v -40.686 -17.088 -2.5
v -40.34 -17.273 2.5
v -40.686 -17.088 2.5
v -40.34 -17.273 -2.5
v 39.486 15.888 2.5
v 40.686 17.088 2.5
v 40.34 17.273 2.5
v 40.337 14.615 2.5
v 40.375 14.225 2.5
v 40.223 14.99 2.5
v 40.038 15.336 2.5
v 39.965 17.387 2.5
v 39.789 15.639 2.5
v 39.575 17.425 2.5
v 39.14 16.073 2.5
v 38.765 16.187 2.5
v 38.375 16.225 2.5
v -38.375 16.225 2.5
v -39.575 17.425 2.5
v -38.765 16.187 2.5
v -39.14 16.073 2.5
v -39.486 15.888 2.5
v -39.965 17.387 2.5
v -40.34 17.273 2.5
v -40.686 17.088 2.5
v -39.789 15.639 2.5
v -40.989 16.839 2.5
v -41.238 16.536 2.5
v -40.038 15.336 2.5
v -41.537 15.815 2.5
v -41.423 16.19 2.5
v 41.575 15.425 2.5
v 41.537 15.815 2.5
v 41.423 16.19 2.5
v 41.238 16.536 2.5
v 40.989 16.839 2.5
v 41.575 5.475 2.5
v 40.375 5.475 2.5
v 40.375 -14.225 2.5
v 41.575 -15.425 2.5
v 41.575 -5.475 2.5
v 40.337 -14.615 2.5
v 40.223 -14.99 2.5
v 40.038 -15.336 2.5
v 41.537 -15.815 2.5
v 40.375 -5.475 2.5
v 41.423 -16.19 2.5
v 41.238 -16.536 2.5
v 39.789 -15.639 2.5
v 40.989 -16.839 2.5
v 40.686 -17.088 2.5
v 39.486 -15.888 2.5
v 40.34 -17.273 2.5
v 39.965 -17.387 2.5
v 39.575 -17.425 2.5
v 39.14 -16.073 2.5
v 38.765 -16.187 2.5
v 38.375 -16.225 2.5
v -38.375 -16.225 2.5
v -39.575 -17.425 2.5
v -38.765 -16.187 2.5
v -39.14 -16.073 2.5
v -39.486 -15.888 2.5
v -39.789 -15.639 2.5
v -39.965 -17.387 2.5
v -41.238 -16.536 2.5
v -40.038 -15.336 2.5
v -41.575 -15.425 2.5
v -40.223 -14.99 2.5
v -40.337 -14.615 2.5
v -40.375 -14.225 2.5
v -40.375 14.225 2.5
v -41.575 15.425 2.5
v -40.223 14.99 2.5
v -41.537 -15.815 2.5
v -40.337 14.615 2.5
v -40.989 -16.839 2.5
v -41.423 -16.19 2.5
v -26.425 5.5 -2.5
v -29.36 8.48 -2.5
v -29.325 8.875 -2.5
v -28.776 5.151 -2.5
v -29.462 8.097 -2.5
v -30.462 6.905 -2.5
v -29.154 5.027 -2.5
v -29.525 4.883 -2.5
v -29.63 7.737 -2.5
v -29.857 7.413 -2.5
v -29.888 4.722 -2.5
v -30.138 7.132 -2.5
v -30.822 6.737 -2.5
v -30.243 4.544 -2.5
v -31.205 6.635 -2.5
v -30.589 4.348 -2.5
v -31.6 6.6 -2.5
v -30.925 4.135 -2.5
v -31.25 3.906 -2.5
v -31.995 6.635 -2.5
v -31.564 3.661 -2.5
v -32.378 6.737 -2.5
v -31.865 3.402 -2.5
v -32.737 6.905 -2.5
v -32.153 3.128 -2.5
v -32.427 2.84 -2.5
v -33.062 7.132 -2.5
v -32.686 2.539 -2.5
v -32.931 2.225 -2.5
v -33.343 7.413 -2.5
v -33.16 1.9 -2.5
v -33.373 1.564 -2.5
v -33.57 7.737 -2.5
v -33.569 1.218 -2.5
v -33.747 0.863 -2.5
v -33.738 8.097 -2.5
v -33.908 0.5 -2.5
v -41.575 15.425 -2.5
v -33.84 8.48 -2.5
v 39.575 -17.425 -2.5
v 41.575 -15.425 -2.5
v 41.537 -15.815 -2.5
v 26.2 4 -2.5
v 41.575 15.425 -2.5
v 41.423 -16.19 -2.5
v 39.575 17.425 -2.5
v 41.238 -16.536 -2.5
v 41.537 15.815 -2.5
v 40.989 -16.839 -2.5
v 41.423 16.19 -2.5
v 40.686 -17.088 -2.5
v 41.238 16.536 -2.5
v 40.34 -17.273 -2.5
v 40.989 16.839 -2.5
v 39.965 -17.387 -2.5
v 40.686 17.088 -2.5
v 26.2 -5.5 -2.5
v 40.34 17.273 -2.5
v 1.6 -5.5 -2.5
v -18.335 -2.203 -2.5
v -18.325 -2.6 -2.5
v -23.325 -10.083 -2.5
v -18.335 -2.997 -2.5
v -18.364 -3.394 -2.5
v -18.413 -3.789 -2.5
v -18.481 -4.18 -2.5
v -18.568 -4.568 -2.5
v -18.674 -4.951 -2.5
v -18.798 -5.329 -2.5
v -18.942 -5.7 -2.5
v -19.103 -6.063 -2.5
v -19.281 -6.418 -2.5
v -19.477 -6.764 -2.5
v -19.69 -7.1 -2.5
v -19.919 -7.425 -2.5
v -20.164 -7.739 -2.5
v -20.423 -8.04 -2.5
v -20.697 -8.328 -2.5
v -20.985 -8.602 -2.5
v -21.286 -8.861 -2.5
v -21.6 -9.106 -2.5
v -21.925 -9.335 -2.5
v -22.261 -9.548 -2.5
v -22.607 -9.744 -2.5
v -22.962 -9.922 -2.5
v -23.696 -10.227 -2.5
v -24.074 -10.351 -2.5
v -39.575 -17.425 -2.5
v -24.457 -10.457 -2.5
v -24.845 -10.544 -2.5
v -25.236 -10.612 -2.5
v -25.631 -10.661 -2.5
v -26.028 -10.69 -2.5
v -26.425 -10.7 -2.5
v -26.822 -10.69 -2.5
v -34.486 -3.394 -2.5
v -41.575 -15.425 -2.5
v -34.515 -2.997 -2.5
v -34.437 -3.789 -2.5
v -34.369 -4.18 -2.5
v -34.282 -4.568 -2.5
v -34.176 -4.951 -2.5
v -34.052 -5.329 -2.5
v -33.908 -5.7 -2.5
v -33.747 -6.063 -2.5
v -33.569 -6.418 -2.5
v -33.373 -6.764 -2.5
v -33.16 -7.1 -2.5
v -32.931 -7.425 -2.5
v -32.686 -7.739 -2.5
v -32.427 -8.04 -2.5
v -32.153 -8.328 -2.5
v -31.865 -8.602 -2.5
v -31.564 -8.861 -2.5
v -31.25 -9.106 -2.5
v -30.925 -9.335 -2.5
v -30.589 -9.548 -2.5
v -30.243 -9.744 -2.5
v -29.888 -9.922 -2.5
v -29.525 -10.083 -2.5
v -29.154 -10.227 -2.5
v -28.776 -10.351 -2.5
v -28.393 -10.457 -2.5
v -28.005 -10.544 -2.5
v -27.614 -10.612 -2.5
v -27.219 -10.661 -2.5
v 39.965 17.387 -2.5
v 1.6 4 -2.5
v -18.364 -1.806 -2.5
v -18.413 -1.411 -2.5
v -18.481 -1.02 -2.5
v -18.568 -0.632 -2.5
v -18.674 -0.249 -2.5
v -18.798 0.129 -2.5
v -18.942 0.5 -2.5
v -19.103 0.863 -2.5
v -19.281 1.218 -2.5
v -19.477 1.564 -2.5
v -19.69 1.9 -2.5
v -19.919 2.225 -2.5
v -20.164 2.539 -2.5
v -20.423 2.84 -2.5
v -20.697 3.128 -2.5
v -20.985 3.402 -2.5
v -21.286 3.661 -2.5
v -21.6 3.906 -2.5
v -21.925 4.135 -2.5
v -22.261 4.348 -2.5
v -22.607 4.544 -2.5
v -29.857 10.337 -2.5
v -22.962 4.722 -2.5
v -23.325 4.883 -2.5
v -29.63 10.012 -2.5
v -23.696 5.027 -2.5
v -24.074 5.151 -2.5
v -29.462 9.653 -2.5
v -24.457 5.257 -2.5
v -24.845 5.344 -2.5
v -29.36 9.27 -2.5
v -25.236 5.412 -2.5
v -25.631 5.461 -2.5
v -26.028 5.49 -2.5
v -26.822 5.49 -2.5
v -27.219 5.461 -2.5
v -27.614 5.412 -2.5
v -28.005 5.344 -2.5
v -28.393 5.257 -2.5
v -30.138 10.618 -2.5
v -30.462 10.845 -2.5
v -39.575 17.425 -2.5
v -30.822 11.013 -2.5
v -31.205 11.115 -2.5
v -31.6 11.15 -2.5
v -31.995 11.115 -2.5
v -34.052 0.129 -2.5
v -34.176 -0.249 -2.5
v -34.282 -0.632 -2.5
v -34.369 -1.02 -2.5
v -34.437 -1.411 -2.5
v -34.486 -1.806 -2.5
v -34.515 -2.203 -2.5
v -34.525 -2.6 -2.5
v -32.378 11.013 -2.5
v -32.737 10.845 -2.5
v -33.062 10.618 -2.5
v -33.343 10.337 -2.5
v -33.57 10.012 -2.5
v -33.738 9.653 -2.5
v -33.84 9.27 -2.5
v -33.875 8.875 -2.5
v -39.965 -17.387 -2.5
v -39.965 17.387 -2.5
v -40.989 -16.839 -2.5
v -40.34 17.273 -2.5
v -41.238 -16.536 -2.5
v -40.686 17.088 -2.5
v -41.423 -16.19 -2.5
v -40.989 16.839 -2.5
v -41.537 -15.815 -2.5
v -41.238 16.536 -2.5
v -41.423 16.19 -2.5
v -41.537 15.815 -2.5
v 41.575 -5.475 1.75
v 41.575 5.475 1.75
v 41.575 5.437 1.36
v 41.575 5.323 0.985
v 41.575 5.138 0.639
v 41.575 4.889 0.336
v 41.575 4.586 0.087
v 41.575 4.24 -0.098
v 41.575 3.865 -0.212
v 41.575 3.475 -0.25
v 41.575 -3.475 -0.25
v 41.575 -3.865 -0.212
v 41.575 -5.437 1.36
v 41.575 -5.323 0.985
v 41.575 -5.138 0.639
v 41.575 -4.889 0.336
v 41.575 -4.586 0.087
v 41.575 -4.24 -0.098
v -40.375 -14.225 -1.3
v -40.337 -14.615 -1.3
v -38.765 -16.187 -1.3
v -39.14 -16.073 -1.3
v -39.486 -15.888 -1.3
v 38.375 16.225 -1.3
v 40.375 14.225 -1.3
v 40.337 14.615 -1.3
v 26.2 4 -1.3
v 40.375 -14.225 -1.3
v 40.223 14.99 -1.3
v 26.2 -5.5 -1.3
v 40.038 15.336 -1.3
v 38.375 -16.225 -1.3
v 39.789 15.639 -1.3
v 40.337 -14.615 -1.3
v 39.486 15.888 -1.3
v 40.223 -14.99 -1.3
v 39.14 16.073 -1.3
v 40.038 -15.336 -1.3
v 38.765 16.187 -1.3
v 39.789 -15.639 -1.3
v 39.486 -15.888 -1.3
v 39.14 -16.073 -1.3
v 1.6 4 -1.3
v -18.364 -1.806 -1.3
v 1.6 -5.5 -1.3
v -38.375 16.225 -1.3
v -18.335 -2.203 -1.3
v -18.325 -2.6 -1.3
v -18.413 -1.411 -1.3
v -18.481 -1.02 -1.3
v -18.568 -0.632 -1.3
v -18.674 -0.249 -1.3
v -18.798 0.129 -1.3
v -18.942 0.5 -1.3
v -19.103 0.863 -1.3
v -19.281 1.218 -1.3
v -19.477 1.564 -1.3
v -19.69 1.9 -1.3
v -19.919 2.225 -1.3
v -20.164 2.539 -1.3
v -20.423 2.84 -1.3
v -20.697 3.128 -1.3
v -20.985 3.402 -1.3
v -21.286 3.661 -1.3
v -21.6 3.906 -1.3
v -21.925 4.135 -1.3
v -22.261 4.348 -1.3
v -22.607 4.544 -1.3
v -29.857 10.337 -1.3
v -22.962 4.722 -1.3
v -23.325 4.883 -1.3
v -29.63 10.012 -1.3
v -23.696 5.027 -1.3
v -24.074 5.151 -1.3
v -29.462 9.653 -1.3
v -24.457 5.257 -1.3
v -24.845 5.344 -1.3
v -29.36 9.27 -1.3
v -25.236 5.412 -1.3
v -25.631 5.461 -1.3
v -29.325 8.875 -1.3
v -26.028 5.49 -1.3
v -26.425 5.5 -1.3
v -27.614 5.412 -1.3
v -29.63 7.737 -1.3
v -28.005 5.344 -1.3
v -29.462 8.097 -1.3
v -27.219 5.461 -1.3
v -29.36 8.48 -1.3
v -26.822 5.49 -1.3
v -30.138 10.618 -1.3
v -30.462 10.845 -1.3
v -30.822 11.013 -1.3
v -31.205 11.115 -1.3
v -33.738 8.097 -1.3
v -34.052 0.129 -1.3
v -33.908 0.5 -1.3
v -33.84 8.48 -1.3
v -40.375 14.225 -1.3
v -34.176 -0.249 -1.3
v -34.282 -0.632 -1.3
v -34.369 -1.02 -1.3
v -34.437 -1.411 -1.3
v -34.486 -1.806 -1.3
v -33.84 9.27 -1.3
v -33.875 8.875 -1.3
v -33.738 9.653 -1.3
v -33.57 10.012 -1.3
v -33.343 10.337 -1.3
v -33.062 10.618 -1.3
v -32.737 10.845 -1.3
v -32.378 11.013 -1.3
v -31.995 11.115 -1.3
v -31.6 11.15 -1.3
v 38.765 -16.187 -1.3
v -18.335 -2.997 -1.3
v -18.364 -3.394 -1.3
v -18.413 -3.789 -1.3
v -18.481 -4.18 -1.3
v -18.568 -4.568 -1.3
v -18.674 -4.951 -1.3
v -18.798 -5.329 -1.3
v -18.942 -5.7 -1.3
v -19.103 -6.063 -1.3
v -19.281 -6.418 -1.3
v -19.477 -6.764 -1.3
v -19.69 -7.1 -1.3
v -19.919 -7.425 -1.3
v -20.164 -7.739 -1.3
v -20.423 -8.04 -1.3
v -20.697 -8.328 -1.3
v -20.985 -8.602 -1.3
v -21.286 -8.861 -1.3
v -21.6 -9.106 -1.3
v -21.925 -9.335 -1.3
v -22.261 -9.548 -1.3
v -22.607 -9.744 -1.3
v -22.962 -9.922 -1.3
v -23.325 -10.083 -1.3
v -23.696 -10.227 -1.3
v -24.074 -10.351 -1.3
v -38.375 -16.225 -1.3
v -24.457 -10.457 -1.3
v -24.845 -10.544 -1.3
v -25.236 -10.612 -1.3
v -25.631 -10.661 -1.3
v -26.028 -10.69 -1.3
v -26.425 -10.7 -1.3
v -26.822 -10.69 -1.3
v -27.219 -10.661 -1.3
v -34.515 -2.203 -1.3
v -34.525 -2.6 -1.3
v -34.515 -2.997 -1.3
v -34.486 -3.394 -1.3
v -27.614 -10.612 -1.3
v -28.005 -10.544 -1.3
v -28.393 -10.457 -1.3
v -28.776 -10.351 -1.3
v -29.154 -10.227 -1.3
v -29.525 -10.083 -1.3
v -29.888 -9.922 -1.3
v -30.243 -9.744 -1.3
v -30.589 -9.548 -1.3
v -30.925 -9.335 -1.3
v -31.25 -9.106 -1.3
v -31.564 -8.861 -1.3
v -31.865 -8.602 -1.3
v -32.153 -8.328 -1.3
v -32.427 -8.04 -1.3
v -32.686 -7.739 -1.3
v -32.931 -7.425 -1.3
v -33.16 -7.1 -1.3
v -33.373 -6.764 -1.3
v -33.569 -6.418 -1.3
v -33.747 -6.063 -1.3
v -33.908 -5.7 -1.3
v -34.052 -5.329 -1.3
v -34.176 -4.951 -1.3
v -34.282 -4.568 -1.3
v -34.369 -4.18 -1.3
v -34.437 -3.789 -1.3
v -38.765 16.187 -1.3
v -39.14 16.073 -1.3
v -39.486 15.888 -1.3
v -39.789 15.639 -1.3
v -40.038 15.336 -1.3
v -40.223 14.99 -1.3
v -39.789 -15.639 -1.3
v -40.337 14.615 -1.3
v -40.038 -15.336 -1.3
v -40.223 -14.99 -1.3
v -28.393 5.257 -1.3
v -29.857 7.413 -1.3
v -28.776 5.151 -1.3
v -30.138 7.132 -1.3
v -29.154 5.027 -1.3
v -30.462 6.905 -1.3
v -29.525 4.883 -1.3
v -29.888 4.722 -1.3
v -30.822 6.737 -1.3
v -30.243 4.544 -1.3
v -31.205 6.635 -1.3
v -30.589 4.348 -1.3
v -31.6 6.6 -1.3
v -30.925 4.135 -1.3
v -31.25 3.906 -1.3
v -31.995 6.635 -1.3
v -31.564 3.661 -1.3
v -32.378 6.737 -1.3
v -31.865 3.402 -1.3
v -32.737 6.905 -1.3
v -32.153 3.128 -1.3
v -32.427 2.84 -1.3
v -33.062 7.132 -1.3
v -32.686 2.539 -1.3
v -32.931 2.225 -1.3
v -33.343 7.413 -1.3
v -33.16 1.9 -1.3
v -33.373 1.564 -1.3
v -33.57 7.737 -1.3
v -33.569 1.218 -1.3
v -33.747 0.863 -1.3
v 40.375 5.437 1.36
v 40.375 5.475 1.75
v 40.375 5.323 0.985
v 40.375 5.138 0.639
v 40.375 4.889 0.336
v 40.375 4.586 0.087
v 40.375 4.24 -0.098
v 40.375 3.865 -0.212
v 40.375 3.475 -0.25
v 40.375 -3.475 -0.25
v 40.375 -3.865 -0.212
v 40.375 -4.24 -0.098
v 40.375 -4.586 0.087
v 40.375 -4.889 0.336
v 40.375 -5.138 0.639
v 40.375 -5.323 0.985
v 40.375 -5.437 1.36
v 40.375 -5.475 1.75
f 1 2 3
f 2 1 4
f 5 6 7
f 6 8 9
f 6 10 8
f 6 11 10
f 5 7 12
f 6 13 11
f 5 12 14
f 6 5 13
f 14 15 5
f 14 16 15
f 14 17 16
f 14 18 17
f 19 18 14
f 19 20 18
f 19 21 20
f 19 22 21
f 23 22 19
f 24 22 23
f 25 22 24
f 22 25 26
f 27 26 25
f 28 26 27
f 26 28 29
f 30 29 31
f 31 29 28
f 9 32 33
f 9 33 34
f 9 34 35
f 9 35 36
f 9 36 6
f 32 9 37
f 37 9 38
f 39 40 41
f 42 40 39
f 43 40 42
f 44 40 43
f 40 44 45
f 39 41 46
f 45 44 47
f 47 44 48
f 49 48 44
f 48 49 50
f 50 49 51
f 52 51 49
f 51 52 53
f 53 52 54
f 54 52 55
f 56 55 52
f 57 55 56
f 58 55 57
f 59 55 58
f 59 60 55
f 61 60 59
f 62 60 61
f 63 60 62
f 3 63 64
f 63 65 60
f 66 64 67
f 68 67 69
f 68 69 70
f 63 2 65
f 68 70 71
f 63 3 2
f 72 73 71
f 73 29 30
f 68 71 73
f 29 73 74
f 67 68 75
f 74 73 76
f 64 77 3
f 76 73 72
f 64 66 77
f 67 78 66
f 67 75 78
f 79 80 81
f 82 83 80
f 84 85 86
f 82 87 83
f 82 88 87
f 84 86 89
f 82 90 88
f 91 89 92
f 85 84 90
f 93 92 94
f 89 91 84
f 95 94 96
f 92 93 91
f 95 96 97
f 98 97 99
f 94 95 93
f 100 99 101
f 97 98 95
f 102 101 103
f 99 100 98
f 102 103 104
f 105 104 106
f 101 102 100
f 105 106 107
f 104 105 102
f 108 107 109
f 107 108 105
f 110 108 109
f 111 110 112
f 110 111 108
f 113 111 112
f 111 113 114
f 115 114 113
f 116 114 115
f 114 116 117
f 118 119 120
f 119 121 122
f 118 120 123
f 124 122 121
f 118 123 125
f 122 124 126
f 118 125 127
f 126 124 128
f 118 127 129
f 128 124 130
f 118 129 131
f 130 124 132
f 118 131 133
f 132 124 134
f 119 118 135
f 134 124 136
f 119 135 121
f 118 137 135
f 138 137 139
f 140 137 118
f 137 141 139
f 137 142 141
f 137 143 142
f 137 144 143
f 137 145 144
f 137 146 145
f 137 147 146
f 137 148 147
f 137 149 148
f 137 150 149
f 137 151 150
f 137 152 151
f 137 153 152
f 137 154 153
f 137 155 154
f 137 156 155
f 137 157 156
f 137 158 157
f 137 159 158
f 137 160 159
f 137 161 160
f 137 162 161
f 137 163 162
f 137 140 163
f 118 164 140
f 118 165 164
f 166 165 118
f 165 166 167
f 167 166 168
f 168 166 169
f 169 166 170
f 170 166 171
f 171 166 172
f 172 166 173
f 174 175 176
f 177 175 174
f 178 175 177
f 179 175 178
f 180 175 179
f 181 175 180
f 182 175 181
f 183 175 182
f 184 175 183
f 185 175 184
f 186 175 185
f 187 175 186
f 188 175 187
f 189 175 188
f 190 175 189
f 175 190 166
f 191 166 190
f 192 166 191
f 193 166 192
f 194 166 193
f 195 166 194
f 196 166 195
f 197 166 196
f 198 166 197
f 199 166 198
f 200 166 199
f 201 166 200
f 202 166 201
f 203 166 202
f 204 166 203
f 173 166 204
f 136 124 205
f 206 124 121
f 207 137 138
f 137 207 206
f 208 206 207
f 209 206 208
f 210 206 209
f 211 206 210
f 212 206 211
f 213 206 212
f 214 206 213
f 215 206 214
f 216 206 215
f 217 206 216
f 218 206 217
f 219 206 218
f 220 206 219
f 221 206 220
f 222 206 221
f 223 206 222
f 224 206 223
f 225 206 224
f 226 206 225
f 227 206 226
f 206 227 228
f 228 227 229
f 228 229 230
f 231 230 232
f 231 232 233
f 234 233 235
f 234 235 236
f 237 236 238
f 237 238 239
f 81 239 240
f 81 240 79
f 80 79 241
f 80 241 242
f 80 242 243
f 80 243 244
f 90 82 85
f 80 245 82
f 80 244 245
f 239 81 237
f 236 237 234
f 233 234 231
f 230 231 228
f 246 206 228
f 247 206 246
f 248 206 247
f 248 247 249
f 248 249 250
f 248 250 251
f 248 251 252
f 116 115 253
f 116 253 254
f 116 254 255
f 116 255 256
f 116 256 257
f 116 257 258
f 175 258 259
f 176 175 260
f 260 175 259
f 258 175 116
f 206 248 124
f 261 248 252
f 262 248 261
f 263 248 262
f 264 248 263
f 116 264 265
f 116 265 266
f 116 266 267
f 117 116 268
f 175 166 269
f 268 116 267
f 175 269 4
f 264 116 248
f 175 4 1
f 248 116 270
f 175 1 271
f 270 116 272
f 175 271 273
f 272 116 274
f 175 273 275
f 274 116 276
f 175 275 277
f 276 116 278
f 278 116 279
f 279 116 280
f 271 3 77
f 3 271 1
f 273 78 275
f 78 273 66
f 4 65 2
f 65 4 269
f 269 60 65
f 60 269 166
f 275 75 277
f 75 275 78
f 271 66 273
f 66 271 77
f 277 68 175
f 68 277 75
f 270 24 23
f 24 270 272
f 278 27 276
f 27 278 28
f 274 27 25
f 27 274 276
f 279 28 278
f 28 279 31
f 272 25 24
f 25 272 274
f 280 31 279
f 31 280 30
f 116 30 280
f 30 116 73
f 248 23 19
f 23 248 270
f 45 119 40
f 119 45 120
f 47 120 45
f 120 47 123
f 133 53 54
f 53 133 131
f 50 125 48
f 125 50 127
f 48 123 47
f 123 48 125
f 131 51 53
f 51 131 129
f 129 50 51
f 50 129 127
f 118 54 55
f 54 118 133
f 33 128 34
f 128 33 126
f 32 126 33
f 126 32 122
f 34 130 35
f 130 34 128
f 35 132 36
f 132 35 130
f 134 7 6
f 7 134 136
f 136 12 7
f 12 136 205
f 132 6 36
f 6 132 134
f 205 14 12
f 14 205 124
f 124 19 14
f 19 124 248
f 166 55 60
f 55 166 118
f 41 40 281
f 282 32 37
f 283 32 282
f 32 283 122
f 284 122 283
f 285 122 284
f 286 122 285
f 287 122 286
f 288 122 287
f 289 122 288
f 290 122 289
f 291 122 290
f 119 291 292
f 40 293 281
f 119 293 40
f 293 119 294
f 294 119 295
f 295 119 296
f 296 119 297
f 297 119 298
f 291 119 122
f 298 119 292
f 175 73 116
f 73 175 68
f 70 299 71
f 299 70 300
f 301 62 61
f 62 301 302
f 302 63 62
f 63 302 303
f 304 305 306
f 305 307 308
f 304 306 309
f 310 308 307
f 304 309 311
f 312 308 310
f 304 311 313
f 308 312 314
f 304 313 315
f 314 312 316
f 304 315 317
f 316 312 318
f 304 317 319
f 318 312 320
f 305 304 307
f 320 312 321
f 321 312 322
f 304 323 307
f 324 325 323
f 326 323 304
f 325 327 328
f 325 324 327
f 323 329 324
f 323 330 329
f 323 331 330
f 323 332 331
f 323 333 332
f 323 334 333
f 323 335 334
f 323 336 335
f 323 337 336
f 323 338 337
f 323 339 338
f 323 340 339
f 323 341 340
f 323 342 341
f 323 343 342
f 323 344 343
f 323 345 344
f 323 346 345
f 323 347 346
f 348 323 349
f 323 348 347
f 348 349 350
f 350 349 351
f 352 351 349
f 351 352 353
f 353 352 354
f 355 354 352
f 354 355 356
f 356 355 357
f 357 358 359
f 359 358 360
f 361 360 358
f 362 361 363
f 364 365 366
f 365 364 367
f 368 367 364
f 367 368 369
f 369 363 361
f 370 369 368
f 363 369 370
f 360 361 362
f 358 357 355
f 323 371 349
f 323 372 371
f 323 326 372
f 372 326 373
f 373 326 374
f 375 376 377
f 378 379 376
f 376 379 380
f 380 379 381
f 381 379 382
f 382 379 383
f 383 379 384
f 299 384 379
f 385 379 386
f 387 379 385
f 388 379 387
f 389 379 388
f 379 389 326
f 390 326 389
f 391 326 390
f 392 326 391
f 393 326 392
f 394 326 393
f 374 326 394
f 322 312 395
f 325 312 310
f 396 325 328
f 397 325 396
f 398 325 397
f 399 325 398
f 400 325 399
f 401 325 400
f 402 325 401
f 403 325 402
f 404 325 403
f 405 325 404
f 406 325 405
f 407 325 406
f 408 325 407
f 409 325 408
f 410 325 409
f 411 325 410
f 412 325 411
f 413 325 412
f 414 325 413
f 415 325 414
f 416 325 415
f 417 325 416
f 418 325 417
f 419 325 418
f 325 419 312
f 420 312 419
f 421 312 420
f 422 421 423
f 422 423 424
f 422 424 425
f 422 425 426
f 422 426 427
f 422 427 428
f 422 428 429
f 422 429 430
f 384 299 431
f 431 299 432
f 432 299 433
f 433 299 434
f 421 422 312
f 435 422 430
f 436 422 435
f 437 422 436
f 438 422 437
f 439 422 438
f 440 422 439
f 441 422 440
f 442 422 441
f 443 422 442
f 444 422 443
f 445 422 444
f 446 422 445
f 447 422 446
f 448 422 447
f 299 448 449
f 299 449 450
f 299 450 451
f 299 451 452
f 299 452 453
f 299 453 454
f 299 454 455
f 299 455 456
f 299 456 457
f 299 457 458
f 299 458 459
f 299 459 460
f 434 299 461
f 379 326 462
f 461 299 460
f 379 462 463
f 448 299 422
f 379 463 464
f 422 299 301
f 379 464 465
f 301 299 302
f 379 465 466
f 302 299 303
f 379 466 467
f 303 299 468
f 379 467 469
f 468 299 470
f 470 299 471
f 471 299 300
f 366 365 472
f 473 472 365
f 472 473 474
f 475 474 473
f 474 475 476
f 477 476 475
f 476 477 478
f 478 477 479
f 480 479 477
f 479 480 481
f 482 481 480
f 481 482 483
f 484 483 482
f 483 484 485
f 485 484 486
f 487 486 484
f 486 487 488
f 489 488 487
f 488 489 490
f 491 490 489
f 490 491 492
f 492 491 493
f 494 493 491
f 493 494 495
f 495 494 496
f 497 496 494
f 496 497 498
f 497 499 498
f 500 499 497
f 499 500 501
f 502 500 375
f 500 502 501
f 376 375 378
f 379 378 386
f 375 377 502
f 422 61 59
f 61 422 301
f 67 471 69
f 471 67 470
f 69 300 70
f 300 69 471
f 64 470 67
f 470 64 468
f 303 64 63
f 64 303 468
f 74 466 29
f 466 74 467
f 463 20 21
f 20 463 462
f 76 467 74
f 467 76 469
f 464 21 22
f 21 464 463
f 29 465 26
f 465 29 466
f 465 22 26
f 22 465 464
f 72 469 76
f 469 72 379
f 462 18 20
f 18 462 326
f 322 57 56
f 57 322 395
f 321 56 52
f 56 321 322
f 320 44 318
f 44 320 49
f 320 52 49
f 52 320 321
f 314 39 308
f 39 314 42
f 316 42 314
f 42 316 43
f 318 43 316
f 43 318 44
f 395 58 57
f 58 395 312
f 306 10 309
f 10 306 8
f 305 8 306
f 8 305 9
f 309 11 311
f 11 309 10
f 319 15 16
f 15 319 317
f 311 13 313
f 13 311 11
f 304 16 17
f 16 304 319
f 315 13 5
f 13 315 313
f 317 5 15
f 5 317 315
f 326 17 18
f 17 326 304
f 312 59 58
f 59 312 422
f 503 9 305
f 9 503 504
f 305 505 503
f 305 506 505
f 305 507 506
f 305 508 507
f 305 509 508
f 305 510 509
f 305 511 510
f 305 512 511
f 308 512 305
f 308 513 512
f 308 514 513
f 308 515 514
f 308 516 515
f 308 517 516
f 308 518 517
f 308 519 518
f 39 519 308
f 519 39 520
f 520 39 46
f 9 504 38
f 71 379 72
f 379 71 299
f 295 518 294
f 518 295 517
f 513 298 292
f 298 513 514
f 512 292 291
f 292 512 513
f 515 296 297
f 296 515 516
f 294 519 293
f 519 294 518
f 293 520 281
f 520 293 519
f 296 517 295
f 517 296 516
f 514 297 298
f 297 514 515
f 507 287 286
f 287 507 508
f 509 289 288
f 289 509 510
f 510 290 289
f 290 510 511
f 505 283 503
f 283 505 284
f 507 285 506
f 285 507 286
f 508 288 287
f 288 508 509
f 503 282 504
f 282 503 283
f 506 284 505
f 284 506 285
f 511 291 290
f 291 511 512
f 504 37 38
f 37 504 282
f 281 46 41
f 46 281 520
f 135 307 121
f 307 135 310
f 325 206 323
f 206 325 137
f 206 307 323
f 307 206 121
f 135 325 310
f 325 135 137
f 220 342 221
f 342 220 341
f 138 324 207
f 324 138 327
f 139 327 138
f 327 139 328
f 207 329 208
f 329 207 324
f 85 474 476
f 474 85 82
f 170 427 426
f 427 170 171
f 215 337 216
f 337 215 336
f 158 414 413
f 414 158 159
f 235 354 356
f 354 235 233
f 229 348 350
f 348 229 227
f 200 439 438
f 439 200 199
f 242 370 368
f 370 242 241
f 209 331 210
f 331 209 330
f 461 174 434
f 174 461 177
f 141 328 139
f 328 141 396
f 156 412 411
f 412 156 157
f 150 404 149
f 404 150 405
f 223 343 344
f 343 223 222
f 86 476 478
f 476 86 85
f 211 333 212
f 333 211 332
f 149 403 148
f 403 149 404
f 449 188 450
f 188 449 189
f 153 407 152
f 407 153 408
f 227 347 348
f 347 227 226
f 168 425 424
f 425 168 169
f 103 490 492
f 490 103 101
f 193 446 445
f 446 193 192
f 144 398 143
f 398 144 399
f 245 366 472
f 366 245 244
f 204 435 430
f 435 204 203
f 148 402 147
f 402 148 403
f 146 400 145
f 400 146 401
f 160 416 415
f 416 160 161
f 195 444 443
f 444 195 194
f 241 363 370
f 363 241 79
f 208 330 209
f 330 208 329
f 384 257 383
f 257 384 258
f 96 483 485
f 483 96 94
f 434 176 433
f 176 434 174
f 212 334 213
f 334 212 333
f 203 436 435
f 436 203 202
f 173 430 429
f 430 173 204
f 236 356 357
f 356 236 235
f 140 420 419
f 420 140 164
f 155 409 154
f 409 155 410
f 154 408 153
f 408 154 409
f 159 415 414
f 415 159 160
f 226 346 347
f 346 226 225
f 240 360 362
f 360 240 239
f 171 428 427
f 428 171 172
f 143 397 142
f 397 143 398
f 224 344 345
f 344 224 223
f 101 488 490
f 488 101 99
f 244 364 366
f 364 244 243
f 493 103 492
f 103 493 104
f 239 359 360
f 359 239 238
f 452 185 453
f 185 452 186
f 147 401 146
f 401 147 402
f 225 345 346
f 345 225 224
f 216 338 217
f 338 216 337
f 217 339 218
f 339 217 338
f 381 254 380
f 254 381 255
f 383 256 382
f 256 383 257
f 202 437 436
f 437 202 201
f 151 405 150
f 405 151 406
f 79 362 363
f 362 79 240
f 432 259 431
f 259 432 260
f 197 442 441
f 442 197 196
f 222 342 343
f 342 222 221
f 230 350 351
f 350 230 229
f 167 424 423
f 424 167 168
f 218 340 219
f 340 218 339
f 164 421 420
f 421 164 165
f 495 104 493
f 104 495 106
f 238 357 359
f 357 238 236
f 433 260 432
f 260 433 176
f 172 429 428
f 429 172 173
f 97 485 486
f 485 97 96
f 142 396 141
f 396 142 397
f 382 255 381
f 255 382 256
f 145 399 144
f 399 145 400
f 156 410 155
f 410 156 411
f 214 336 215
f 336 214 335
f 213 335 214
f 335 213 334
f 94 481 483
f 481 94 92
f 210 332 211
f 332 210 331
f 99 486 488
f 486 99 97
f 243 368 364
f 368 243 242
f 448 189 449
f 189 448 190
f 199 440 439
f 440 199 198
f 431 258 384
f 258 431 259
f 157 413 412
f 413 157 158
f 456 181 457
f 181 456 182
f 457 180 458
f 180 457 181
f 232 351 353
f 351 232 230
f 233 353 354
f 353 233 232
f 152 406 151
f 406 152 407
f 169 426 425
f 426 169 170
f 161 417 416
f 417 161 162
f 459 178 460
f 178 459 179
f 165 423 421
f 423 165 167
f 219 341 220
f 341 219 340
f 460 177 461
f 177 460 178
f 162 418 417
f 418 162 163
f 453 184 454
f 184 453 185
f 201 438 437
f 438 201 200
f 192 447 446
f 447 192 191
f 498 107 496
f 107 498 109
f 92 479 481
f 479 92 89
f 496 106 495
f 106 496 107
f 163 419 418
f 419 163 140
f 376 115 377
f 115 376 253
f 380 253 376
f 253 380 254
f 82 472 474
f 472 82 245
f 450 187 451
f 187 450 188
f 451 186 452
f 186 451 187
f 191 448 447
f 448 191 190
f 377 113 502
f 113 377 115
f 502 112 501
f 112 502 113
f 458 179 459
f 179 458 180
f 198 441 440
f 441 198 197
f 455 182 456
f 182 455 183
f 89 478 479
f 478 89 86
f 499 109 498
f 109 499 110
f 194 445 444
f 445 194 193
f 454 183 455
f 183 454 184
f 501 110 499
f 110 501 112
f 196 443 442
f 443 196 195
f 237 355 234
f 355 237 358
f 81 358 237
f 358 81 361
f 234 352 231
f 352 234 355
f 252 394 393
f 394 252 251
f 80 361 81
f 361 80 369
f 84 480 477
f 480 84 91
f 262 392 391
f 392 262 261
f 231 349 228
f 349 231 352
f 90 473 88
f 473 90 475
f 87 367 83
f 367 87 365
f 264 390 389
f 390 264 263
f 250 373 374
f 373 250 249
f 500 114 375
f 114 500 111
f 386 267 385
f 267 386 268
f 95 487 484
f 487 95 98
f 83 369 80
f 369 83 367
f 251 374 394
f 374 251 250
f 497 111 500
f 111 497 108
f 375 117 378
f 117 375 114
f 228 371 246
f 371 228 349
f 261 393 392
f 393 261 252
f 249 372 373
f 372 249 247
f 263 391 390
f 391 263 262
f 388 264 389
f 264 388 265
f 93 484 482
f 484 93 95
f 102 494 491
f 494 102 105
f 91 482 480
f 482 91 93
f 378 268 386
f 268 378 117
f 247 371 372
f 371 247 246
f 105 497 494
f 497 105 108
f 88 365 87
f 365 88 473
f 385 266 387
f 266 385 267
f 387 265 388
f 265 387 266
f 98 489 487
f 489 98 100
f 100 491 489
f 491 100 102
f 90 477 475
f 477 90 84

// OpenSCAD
//	PasswordPumpV2Box v6
//
//		By: scootercommuter
//
//		License: Creative Commons, Attribution
//
//		Updates for v6.1
//			In this version, do not modify object geometry.
//			Do comment and code cleanup.
//		Changes in v6.0
//			Parameterize mount holes, countersinks and standoffs

use <MCAD/boxes.scad>
$fa=1;
$fs=0.4;

create_box = false; 
create_lid = true;

part_separation = 5;	//	if generating both parts in one STL, 
								//	separate them by this y distance

//		=  =  =  =  =  =  =  =  =  =  =  =
//		Dimensions for the Lid and Holes
//		=  =  =  =  =  =  =  =  =  =  =  =

lid_h			= 5;			// total lid height
ltop_h		= 1.2;		// height (thickness) of top of lid
lid_wall	= 1.2;		// thickness of the lid wall
lid_slack	= 0.2;		// how tight the lid fits

//		LCD window
lcdw_l = 24.6;
lcdw_w = 9.5;
lcd_l_offset =  1.6;		// center of board (x) to right edge of lcd window
lcd_w_offset = -5.5;		// center of board (y) to lower edge of lcd window

//		Knob hole
kh_d = 16.2;
kh_l_offset = -26.425;	// center of board (x) to center of knob hole
kh_w_offset = -2.6;		// center of board (y) to center of knob hole

//		LED hole
ledh_d = 4.55;
ledh_l_offset = -31.6;
ledh_w_offset =  8.875;

//		=  =  =  =  =  =  =  =
//		Dimensions for the Box
//		=  =  =  =  =  =  =  =

wall_w   = 1.4; // thickness of box case walls
c_radius = 2; 	// corner curve radius

//		circuit board dimensions
//
board_l       = 75.75;
board_w       = 27.45;
board_h       = 1.5;	 // thickness of circuit board
board_holes_l = 70.5; // center distance between board mounting holes
board_holes_w = 22;
board_slack   = 1.0;	 // edge of board to inside wall of box (per side)
top_slack     = 0.8;	 // top of screen to inside top of box
screen_offset = 10;	 // top of circuit board to top of screen

reset_button_offset_r = 10.2;		// right edge of board to center of reset button
reset_button_hole_dia = 3.75;

usb_cutout_offset = 5.75; // offset, horiz center of USB cutout above top of board
cable_housing_l = 9.95;   // supplied USB cable housing size
cable_housing_w = 6.50; 
housing_slack   = 1.0;    // clearance from edge of cable housing to hole edge

standoff_h = 5;
standoff_d = 5;			// max possible diameter to avoid running into board parts
standoff_hole = 2.4;	// drill for M2 screws

countersink_d = 5;			// countersink diameter for M2 hex nut
countersink_h = 2.2;		// countersink height for M2 hex nut thickness;
									// Actual s/b 1.6, increased since 8mm screws are too short.

bottom_h = 2.5; // thickness of bottom, must be greater than countersink height

//  =  =  =  =  =  =  =  =  =
//  =  End of Definitions   =
//  =  =  =  =  =  =  =  =  =

box_l = board_l + (wall_w * 2) + (board_slack * 2);
box_w = board_w + (wall_w * 2) + (board_slack * 2);
box_h = bottom_h + standoff_h + board_h + screen_offset + top_slack;

lid_l = box_l + (lid_wall * 2) + lid_slack;
lid_w = box_w + (lid_wall * 2) + lid_slack;

if (create_box == true) make_box();
if (create_lid == true) make_lid();

module make_box() {
	difference () {
		// Outside of box
		roundedBox(size=[box_l, box_w, box_h], radius = c_radius, sidesonly=true);
		// cutout inner box to create hollow box
		//		(inner box cutout has square corners to fit the circuit board corners)
		translate([0, 0, bottom_h])
			cube(size = [box_l - (wall_w * 2), 
									   box_w - (wall_w * 2),
									   box_h],center=true);
		// cut counter-sink holes for hex nuts, and round holes for screws
		mount_hole( board_holes_l/2,  board_holes_w/2, -box_h/2 );
		mount_hole( board_holes_l/2, -board_holes_w/2, -box_h/2 );
		mount_hole(-board_holes_l/2,  board_holes_w/2, -box_h/2 );
		mount_hole(-board_holes_l/2, -board_holes_w/2, -box_h/2 );

		// cut reset button hole
		translate([board_l / 2 - reset_button_offset_r, 0, -box_h / 2 - .001])
			cylinder(h = bottom_h + .002, r = reset_button_hole_dia/2);
		// cut USB cable hole
		translate([ (box_l - 2*wall_w)/2, 0,
							(-box_h / 2) + bottom_h + standoff_h + board_h + usb_cutout_offset ])
			rotate([90, 0, 90])
			roundedBox(size=[cable_housing_l + housing_slack,
									 cable_housing_w + housing_slack,
									 wall_w*2 + .002],
						   radius = c_radius, sidesonly=true);
	} // end difference()
	
	//	generate standoffs
	make_standoff( board_holes_l/2,  board_holes_w/2, -box_h/2 + countersink_h );
	make_standoff( board_holes_l/2, -board_holes_w/2, -box_h/2 + countersink_h );
	make_standoff(-board_holes_l/2,  board_holes_w/2, -box_h/2 + countersink_h );
	make_standoff(-board_holes_l/2, -board_holes_w/2, -box_h/2 + countersink_h );

}	// end module make_box

module mount_hole(x, y, z) {
	// countersink hex nut hole and cut through-hole for M2 screw
	translate([x, y, z - .001])
		cylinder(h=countersink_h + .001, r=countersink_d/2, $fn=6);
	translate([x, y, z - .001])
		cylinder(h=bottom_h + countersink_h + .002, r=standoff_hole/2);
} // end module mount_holes

module make_standoff(x, y, z) {
	difference() {
		translate([x, y, z])	// puts us at the top of the contersink cutout
			cylinder(h=standoff_h + bottom_h - countersink_h, r=standoff_d/2);
		translate([x, y, z - .001])
			cylinder(h=standoff_h + bottom_h - countersink_h + .002, r=standoff_hole/2);
	}
} // end module make_standoff

module make_lid() {
	// if we're generating both box AND lid, offset the lid by part_separation (y),
	//	set z origin to same origin as the box part, so they sit on the same base plane.
	y_move = create_box==true ? -box_w - part_separation : 0;
	z_move = create_box==true ? -box_h/2 + lid_h/2 : 0;

	translate([0, y_move, z_move])
		difference() {
			// Outside of lid
			roundedBox( size=[lid_l, lid_w, lid_h], radius = c_radius, sidesonly=true );
			// inside lid box cutout
			translate([0, 0, ltop_h])
				roundedBox(size=[ lid_l - 2*lid_wall,
										  lid_w - 2*lid_wall, lid_h],
					radius = c_radius, sidesonly=true);
			// lcd window cutout
			translate([ lcd_l_offset, lcd_w_offset, -lid_h/2 - .001 ])
				cube([lcdw_l, lcdw_w, ltop_h + .002]);
			// knob hole
			translate([ kh_l_offset, kh_w_offset, -lid_h/2 - .001 ])
				cylinder(h=ltop_h + .002, r=kh_d/2);
			// led hole
			translate([ ledh_l_offset, ledh_w_offset, -lid_h/2 - .001 ])
				cylinder(h=ltop_h + .002, r=ledh_d/2);
			// USB cable cutout
			translate([ (lid_l/2 - lid_wall) - .001, 0,
							lid_h/2 + 1 ])
				rotate([90, 0, 90])
				roundedBox(size=[cable_housing_l + housing_slack,
										 cable_housing_w + housing_slack,
										 lid_wall*2 + .004],
							   radius = c_radius, sidesonly=true);
		}
}	// end module make_lid
